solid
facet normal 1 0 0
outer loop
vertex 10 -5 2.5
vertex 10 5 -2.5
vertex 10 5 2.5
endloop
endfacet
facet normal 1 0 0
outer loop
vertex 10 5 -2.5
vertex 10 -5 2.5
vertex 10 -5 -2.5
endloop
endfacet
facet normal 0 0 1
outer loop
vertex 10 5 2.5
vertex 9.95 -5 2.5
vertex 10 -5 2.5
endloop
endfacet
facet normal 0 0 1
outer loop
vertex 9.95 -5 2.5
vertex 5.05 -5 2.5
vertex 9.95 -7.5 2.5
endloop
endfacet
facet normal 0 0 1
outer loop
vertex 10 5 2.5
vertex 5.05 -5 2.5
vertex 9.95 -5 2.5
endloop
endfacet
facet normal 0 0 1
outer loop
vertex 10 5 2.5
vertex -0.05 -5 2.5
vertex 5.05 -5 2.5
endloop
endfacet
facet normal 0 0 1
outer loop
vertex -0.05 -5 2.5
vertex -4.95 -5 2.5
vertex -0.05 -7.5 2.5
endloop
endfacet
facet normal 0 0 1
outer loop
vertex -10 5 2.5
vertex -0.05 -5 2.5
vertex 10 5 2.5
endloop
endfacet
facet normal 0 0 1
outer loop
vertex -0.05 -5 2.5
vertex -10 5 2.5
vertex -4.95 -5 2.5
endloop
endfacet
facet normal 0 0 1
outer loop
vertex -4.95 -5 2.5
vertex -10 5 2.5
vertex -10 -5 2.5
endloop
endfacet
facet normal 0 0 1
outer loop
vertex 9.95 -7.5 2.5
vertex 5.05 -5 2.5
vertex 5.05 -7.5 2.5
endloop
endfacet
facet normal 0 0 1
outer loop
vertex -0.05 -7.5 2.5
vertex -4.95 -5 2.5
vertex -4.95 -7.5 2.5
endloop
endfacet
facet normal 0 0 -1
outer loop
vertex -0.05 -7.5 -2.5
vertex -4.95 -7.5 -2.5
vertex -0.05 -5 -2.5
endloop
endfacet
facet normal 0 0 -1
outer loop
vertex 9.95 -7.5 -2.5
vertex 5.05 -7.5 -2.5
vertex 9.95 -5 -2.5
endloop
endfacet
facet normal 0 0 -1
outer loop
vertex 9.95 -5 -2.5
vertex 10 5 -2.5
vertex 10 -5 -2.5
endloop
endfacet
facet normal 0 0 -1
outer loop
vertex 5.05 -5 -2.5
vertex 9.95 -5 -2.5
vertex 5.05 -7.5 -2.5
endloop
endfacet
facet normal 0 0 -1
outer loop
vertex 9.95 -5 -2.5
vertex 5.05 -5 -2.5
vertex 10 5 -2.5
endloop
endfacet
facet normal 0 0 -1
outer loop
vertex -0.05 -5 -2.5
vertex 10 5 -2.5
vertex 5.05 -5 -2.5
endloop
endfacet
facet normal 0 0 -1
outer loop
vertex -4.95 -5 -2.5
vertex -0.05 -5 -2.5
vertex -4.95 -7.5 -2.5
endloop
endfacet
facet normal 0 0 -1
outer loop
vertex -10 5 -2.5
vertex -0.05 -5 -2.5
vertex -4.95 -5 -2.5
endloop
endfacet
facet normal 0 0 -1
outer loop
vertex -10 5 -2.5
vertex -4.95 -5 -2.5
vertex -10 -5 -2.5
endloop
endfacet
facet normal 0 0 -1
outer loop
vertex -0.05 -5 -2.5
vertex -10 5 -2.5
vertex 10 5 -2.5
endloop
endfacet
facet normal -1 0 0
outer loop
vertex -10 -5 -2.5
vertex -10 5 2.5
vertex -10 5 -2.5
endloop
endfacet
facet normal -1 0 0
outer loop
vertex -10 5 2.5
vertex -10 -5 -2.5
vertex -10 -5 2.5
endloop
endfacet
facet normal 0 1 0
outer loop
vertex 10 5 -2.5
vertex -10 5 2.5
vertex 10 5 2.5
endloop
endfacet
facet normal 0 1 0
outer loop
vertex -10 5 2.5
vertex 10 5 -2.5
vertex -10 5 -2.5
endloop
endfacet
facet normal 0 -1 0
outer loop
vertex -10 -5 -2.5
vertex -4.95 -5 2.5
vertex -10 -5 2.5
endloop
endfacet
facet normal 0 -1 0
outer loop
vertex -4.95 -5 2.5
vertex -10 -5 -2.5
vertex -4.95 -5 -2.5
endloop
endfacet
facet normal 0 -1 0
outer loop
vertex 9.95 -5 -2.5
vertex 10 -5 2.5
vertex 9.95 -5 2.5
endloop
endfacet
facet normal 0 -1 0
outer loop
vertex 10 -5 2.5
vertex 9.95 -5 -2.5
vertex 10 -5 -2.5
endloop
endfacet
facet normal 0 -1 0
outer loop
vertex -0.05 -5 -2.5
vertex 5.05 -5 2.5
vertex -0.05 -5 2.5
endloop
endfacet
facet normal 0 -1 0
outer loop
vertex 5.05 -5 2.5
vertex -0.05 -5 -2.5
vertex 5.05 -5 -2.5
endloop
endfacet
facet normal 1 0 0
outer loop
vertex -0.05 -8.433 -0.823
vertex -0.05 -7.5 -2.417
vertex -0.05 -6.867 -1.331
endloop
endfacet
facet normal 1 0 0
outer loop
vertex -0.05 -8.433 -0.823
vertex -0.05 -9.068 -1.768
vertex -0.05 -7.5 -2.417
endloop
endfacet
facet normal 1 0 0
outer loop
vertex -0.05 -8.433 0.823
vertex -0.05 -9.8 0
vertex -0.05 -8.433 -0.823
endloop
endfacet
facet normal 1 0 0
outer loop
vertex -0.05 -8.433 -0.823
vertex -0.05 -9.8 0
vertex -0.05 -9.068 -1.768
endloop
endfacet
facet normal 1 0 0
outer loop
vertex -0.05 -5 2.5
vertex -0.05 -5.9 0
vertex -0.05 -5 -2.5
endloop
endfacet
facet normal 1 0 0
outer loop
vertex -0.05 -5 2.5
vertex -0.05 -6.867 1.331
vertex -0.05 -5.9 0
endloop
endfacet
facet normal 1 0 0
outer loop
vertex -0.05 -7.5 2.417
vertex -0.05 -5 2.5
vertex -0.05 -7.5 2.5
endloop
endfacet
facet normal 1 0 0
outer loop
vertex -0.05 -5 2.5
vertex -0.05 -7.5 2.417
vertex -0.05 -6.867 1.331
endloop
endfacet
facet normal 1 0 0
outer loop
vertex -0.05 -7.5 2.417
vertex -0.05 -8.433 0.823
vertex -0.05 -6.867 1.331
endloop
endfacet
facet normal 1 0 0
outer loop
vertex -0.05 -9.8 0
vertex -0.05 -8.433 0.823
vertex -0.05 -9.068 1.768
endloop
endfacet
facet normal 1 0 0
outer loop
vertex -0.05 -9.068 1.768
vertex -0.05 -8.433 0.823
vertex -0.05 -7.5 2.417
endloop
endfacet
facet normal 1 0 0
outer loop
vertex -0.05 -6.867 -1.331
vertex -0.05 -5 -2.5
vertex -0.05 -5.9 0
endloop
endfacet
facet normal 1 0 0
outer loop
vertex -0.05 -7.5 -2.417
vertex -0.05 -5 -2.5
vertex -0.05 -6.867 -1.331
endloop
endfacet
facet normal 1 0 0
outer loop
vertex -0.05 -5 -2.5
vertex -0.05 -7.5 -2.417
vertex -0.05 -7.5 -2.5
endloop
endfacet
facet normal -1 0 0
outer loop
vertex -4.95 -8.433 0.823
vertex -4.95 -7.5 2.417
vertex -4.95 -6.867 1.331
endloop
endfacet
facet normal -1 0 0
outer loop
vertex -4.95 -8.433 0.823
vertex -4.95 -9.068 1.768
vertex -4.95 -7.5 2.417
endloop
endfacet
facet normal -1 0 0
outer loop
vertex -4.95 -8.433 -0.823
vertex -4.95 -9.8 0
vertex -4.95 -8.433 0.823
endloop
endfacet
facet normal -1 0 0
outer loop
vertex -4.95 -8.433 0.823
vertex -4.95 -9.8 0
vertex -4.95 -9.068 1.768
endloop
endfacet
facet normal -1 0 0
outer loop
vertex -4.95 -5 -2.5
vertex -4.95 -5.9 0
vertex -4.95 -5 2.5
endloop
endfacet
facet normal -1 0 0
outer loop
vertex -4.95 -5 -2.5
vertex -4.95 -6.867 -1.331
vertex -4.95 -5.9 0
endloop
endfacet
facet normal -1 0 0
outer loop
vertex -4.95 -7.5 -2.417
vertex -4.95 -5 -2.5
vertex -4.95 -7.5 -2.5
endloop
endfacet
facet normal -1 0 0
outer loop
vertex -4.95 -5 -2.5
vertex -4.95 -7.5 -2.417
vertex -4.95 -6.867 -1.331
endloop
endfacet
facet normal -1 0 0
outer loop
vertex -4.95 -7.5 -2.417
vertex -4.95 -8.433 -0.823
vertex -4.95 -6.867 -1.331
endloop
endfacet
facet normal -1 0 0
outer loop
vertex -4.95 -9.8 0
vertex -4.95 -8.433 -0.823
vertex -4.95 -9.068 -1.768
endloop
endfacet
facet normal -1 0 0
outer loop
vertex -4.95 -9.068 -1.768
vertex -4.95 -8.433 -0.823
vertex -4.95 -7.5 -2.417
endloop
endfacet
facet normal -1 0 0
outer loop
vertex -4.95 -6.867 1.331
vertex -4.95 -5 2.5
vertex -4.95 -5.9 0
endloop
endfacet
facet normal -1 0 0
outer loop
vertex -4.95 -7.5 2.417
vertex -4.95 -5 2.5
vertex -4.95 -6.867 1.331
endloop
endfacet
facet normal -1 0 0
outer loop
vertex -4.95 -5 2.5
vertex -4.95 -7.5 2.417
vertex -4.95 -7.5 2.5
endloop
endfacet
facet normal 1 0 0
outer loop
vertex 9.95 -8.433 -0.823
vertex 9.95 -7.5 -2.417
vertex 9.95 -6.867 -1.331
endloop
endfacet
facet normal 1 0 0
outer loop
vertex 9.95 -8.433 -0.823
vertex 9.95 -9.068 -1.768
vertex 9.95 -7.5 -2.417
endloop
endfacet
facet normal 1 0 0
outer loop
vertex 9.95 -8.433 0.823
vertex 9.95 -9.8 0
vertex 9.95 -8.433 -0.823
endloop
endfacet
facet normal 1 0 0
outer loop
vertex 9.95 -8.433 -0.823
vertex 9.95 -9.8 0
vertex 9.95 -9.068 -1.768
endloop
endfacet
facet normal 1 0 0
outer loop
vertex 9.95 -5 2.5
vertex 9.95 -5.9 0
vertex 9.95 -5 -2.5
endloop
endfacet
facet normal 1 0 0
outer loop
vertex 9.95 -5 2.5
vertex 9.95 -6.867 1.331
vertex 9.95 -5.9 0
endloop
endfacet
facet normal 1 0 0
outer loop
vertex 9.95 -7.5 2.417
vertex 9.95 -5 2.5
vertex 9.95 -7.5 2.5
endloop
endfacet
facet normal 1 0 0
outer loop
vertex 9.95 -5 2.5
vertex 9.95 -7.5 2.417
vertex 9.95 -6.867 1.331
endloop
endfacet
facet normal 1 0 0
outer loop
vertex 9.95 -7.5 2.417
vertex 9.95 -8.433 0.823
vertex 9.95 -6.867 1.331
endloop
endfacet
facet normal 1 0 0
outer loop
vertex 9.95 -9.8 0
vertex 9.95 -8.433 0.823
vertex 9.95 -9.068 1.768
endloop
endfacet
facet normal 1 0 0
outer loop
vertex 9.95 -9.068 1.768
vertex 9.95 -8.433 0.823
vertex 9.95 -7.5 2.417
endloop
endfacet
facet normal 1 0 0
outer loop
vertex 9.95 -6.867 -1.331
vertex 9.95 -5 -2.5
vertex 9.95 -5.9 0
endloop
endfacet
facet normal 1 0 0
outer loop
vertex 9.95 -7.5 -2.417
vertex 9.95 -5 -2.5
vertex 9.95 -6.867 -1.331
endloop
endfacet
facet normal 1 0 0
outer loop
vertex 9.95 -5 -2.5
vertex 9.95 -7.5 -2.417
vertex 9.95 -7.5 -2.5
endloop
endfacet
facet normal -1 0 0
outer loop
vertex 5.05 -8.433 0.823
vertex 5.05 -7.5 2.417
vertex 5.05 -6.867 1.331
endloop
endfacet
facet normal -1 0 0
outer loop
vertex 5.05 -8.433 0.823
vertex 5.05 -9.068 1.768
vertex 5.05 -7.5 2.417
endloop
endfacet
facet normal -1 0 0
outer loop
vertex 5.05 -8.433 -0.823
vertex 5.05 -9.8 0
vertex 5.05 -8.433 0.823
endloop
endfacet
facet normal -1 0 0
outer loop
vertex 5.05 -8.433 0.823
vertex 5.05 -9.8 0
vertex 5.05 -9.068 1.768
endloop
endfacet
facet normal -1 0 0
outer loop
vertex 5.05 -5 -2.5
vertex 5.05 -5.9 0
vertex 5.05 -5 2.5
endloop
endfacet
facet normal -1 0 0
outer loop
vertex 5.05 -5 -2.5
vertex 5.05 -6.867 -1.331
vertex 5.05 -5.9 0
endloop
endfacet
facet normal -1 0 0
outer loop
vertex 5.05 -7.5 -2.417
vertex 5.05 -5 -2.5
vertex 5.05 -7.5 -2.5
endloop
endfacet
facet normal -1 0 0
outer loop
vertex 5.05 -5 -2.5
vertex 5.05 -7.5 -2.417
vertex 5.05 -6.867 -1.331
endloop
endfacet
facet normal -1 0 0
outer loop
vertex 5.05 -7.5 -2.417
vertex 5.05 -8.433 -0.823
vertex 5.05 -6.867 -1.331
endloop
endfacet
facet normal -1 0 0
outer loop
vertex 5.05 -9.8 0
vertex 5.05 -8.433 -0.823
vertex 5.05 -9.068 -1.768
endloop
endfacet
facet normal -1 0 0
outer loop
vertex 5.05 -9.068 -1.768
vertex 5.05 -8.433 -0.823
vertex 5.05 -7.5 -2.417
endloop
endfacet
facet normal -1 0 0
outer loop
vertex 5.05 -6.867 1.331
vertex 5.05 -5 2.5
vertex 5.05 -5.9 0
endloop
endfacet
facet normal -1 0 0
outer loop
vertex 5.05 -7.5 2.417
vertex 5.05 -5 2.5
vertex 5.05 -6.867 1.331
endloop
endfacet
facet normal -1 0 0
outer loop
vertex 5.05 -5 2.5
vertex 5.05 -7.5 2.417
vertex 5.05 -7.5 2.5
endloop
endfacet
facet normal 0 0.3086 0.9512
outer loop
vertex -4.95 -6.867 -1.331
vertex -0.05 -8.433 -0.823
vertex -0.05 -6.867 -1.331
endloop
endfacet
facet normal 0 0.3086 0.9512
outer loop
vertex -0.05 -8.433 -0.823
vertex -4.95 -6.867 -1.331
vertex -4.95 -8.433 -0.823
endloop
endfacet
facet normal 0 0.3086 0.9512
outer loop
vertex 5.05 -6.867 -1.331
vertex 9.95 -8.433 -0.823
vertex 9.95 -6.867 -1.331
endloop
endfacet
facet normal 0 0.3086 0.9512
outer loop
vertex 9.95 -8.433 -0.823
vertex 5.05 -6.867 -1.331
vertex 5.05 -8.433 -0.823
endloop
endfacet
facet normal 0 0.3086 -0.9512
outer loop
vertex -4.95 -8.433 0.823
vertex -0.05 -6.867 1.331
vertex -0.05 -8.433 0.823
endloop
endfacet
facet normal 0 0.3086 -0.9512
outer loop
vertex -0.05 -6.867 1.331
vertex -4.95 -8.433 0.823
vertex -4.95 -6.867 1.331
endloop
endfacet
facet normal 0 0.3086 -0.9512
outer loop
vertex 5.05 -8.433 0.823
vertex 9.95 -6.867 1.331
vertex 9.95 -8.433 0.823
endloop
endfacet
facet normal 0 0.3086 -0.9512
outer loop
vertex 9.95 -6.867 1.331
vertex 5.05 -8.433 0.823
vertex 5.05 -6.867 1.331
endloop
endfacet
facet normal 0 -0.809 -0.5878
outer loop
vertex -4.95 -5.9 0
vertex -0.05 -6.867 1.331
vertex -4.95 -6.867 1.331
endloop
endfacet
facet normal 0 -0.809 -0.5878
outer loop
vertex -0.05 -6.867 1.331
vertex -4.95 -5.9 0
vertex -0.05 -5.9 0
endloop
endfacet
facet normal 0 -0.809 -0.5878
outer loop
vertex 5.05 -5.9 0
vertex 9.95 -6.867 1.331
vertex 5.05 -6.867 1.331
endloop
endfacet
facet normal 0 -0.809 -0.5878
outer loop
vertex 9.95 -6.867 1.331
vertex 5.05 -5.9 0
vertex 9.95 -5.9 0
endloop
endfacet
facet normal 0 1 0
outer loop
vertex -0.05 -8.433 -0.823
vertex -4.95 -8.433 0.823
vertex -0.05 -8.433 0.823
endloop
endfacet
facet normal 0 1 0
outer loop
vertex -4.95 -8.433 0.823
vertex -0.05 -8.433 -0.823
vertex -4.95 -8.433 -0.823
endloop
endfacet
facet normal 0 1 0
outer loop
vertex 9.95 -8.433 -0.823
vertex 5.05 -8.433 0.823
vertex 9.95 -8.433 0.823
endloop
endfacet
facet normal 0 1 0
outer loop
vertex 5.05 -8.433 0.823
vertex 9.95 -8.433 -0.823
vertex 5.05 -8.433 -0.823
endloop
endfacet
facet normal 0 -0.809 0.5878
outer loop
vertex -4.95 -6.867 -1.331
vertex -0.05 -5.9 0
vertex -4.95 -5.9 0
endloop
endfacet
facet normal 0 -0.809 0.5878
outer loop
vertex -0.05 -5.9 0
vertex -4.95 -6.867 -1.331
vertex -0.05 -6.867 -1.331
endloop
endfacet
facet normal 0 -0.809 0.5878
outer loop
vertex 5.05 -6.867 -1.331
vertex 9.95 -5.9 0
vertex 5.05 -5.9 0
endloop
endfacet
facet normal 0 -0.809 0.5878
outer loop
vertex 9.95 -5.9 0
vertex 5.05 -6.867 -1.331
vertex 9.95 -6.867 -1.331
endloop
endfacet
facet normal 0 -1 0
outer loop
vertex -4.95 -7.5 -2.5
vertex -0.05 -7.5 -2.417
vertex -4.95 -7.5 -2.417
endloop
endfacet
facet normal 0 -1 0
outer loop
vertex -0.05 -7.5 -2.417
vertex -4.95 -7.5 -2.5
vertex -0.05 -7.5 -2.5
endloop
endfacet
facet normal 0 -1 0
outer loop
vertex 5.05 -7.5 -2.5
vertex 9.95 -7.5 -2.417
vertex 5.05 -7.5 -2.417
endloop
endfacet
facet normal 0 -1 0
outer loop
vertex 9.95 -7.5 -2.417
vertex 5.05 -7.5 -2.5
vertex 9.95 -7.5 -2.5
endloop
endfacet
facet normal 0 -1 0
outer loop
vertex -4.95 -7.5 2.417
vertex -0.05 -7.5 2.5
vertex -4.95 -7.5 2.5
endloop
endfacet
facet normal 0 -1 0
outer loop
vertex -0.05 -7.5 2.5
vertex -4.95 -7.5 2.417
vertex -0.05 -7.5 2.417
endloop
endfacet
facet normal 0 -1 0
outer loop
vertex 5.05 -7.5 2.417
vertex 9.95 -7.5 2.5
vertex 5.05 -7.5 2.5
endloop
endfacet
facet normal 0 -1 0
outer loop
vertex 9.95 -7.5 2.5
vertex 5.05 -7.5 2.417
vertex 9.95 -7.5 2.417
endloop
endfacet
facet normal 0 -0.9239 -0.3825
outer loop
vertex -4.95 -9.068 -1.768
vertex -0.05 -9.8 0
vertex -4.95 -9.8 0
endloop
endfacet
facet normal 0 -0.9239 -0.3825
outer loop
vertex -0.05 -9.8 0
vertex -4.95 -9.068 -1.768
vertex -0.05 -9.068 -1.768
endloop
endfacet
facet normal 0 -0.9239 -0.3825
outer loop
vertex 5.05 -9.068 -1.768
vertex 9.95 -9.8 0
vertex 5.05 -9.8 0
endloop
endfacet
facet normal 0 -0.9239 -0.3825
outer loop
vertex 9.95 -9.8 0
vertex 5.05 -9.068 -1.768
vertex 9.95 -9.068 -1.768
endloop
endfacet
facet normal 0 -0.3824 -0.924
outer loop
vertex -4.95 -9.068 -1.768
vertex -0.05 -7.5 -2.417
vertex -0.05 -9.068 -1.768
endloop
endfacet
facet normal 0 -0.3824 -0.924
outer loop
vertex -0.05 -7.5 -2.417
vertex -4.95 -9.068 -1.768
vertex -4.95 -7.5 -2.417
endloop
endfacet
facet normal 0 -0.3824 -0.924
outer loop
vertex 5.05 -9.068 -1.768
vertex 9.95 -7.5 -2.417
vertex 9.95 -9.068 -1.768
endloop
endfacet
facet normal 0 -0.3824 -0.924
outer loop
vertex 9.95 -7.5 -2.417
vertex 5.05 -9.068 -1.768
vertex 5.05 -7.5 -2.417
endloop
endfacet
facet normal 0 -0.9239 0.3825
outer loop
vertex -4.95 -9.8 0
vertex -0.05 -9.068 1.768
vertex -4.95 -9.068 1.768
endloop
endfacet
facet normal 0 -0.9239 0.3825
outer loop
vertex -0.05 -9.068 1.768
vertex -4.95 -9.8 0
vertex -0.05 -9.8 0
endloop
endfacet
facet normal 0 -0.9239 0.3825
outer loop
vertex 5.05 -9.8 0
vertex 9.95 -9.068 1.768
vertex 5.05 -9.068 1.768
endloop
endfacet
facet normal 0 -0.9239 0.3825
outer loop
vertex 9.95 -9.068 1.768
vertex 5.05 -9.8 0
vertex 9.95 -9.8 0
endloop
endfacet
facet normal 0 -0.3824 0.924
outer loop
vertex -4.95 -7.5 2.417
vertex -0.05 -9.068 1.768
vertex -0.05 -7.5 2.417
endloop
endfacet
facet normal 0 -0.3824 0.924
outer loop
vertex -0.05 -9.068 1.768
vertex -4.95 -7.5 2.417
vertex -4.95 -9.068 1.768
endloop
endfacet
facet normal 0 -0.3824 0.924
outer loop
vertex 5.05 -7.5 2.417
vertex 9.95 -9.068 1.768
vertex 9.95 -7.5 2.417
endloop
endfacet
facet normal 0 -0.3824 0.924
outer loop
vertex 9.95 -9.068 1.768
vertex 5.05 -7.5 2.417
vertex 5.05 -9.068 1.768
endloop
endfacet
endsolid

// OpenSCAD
/*

cd /Users/d/Desktop/3dprint/ImplicitCad/
~/.cabal/bin/extopenscad dente3.scad

*/

// programando com a gabi depois do bueno. primeiro dia de impressora 3d.

$res=0.15;

intersection() {
	difference (r=1) {
		union(){
			cube(size = [20, 10, 5], center = true);
			translate([-2.5, -2.5, 0])
			cube(size = [4.9, 15, 5], center = true);
			translate([7.5, -2.5, 0])
			cube(size = [4.9, 15, 5], center = true);
		}
		translate([0, -7.3, 0])
		rotate(a=90, v = [1.0,0.0,0.0])
		rotate(a=90, v = [0.0,1.0,0.0])
		cylinder(r=1.4, h=25, center = true);

	}

	union() {
		cube(size = [20, 15, 5], center = true);
		translate([0, -7.3, 0])
		rotate(a=90, v = [1.0,0.0,0.0])
		rotate(a=90, v = [0.0,1.0,0.0])
		cylinder(r=2.5, h=25, center = true);
	}

}
